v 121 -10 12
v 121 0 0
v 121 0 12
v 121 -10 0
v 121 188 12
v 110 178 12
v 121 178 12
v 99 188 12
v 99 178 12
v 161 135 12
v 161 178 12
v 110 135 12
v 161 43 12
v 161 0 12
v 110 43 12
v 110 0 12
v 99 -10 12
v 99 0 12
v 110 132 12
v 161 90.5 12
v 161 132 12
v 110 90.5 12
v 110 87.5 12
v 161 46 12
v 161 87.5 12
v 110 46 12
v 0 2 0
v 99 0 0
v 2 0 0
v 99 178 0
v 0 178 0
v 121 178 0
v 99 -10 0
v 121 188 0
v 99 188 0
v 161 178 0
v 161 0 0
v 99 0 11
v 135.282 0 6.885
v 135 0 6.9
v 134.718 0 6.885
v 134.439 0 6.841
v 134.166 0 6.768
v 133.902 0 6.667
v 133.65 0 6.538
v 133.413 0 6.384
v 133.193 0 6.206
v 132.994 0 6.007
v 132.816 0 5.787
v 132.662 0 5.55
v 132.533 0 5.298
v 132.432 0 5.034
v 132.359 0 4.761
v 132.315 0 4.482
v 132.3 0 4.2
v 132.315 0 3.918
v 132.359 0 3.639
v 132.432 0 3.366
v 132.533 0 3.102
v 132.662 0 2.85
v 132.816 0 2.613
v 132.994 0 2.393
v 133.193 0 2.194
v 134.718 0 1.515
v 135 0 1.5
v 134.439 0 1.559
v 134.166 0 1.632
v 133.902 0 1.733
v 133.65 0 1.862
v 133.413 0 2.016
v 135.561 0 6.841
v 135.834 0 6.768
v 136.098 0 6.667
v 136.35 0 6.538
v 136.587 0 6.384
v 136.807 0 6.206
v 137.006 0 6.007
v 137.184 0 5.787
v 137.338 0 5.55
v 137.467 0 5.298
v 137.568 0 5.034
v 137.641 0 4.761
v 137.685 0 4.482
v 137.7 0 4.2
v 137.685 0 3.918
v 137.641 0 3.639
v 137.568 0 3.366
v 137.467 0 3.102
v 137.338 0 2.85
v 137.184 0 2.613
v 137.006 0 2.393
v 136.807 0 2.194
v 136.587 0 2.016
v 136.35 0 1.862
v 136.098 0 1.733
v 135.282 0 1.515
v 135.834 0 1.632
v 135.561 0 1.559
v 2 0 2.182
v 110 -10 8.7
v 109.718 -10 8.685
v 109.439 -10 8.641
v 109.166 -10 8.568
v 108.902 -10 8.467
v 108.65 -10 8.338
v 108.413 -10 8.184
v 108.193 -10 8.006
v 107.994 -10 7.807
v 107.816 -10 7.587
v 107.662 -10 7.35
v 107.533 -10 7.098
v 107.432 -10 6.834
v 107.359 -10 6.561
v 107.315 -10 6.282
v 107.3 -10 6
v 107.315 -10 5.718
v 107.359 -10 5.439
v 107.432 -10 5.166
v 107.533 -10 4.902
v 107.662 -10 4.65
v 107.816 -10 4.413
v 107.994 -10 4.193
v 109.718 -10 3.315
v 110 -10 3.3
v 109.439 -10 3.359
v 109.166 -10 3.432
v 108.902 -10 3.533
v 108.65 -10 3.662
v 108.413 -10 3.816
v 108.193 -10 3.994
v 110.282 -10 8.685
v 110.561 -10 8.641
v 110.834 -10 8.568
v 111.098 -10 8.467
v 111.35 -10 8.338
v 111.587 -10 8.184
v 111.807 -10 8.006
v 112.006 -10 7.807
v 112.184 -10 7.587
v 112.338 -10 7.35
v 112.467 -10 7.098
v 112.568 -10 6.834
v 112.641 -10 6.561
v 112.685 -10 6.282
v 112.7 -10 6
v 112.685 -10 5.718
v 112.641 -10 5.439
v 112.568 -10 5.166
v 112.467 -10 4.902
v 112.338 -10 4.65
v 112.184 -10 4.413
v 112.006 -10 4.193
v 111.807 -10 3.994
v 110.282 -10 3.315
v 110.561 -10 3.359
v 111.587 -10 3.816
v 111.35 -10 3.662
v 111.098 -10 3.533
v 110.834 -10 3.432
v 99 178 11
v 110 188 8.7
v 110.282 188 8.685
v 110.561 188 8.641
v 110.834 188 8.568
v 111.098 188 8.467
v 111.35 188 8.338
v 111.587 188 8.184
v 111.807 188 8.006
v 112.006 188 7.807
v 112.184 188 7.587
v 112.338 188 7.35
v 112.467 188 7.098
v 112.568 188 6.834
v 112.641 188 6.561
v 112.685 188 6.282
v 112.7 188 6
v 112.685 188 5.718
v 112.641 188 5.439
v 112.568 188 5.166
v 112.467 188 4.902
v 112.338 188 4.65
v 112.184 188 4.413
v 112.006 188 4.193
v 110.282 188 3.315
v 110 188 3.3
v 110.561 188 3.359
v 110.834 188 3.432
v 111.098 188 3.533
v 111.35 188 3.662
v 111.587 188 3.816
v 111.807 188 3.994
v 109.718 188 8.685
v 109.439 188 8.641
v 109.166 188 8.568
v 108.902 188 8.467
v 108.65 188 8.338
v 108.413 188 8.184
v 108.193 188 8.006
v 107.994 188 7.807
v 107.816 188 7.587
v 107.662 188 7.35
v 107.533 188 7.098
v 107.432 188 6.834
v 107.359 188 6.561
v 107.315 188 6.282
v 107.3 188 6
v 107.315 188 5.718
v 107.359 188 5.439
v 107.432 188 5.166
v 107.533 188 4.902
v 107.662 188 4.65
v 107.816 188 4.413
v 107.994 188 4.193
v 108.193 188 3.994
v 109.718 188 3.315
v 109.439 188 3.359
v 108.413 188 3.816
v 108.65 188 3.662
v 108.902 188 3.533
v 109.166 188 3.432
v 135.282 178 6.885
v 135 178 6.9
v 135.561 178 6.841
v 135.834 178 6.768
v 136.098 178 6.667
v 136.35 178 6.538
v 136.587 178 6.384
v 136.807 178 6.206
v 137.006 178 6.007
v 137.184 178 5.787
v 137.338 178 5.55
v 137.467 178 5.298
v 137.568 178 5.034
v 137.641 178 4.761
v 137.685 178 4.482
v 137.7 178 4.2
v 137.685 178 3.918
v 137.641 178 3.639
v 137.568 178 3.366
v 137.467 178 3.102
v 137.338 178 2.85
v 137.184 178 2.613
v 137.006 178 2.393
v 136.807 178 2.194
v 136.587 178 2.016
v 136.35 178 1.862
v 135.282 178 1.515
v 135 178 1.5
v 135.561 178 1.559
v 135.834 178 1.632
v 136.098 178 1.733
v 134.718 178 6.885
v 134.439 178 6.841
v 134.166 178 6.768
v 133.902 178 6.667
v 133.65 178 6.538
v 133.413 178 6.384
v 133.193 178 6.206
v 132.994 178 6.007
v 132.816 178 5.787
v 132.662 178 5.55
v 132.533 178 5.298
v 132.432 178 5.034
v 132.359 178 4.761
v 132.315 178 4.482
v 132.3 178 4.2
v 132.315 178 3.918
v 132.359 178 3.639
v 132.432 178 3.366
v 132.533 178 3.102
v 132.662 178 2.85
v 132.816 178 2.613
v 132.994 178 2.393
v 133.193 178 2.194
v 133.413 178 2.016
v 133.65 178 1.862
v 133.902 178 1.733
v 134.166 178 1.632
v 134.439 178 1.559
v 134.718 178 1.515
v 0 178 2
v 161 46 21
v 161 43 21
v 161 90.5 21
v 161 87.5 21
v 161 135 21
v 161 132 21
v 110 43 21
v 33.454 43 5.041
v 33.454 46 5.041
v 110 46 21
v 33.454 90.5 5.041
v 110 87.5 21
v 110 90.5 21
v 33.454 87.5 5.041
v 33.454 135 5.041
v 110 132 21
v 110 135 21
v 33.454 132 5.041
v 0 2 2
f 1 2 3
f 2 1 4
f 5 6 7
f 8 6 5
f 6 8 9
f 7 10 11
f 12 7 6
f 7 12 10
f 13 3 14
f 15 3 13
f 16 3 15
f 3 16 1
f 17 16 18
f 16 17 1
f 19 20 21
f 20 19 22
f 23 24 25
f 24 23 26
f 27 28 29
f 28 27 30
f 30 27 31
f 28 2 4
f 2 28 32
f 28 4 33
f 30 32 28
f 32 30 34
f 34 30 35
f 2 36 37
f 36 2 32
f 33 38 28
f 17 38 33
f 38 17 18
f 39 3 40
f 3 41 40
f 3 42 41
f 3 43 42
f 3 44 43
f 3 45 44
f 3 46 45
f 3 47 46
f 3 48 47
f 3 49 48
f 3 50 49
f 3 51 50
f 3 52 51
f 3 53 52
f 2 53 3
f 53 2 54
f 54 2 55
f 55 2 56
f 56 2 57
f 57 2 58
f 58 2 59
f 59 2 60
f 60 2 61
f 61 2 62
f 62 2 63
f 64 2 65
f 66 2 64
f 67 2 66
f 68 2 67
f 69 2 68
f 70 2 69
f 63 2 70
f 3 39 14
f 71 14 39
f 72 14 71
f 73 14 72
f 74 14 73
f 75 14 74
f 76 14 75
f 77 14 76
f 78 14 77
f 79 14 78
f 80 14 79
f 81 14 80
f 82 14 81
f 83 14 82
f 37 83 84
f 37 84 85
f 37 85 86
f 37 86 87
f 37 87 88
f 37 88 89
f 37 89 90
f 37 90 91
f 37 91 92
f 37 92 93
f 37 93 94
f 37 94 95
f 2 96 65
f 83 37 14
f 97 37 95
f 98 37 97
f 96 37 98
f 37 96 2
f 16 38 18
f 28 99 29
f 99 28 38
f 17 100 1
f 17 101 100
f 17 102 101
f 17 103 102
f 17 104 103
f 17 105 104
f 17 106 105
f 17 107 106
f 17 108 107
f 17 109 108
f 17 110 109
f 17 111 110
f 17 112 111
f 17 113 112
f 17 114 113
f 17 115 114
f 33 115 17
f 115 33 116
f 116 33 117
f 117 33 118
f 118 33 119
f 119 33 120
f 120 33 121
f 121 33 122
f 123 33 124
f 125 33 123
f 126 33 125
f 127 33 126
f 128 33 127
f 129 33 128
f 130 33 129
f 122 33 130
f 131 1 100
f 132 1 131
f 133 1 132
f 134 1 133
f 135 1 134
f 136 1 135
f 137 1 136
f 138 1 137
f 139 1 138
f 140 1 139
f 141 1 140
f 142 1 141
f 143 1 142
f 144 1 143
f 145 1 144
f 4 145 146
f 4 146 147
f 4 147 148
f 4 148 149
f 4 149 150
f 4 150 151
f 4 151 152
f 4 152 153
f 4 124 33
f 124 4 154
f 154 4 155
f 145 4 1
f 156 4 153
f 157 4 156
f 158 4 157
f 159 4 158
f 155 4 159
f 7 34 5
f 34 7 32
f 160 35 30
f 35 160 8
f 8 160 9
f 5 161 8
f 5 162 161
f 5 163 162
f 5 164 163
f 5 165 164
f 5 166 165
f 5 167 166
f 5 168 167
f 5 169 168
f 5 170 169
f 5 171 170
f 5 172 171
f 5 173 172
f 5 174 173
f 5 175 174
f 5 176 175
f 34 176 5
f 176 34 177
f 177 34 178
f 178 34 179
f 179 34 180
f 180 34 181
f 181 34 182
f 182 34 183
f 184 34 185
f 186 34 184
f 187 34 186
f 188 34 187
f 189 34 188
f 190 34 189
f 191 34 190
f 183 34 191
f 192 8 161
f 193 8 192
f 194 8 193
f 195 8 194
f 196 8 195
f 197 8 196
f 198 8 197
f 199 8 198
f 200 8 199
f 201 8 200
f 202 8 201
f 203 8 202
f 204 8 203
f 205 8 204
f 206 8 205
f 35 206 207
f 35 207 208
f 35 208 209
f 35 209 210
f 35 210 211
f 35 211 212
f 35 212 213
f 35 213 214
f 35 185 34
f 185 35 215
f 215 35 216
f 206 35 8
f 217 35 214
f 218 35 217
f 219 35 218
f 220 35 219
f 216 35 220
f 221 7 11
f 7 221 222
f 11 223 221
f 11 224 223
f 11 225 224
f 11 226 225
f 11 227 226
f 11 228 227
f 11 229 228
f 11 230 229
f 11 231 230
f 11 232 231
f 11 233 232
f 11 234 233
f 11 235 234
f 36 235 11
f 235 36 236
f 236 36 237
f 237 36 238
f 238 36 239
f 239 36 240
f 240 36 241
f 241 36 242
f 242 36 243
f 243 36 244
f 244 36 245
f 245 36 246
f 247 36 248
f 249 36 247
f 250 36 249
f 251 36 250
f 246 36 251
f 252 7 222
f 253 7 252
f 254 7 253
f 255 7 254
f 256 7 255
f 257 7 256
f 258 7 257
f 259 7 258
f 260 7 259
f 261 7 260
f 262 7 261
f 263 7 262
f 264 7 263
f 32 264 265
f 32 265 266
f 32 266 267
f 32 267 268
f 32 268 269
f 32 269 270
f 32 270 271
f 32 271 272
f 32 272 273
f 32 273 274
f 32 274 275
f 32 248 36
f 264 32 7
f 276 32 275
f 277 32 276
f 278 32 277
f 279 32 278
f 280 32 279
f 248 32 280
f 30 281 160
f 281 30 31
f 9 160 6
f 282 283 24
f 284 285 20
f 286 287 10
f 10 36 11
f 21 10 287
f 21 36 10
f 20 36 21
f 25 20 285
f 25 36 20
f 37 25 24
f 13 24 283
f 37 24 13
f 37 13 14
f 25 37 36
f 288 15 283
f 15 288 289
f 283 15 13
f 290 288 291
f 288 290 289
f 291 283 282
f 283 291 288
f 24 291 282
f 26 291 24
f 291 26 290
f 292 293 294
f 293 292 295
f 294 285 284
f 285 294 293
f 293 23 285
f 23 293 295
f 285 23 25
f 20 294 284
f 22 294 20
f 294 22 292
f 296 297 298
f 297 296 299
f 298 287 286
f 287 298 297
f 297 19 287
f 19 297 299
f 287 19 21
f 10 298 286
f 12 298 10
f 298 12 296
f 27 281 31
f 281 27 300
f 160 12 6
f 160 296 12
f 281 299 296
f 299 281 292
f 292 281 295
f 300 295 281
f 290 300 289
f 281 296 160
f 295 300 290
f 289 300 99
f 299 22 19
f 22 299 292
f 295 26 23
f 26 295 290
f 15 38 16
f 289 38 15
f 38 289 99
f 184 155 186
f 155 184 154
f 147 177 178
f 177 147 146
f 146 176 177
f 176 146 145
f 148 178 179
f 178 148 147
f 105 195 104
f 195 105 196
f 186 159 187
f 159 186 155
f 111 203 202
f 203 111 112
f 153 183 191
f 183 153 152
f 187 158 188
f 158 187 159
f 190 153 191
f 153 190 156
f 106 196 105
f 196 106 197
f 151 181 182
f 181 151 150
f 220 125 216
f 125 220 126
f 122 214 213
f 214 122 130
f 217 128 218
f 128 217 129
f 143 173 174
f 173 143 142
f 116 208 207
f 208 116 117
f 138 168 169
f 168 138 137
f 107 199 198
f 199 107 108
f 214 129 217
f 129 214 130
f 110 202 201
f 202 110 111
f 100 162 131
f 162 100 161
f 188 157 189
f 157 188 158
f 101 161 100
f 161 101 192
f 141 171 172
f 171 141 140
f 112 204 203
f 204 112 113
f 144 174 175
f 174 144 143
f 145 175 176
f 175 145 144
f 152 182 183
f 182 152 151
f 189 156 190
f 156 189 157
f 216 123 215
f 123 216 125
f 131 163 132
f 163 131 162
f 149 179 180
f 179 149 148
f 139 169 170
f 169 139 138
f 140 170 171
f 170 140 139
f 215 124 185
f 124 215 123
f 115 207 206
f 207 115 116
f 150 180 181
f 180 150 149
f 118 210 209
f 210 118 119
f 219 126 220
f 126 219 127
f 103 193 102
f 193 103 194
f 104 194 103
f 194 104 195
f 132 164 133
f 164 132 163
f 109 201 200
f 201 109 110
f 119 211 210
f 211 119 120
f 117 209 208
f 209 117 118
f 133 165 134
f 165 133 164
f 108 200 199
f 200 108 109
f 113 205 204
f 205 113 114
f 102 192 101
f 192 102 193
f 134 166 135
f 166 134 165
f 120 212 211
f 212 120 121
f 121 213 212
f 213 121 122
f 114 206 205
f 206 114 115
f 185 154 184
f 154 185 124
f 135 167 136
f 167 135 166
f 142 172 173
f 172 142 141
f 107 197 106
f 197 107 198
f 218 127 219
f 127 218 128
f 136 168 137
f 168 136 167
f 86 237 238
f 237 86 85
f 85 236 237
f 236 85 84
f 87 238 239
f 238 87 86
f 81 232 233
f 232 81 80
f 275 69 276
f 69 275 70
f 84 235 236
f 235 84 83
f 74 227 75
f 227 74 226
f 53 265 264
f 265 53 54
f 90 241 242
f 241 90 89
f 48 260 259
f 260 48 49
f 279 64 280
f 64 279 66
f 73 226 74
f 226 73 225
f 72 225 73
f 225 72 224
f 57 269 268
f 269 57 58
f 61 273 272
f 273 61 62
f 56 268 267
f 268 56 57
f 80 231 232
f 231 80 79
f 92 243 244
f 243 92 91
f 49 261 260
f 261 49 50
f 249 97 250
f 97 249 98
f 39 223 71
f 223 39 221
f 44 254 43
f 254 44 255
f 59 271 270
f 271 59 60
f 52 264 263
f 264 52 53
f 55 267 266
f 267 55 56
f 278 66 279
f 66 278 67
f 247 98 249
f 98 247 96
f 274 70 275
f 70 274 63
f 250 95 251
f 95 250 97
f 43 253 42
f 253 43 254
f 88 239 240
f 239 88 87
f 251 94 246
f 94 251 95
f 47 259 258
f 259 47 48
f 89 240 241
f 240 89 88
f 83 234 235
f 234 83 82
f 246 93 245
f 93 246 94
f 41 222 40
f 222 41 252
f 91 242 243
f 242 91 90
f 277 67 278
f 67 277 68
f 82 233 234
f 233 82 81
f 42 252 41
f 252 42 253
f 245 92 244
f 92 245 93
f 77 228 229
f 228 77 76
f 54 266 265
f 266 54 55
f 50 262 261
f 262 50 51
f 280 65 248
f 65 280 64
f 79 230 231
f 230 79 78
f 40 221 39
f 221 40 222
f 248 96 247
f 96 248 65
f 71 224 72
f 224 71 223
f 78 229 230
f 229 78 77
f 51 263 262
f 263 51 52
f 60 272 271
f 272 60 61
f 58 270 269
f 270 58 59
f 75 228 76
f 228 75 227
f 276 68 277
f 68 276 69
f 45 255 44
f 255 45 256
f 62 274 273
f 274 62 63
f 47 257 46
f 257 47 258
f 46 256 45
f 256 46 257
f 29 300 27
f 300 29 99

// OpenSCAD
// ═══════════════════════════════════════════════════════════════════
//  THE GHOST ROBOT — Flipper Arm
//  ─────────────────────────────
//  Pivot-lever wedge flipper for 25mm linear actuator
//
//  HOW IT WORKS:
//    1. Pivot bolt runs through the ears → fixed to chassis side walls
//    2. Arm rests with tip at ground level (~2mm clearance)
//    3. Actuator rod connects through the rear hole (bolt in Y direction)
//    4. Actuator extends → pushes rear section → tip rises → flips opponent
//
//  Side view:
//
//    [chassis front]
//         |
//    ─────●──────────────────── tip  ← resting position (wedge low)
//    pivot↑
//         |
//    ACT══● ← actuator pushes here (below pivot on rear section)
//
//    When ACT extends:
//    tip ╱╱╱╱  ← rises up ~50mm from 25mm actuator stroke
//
//  PRINT SETTINGS:
//    Material   : PETG
//    Layer      : 0.2mm
//    Infill     : 40% gyroid
//    Perimeters : 4
//    Orientation: flat (bottom face down, no supports needed)
//
//  HARDWARE:
//    Pivot  : M5 bolt × 2 + M5 nuts (through chassis side walls + ears)
//    Actuator: M5 bolt through rear hole → actuator rod end clevis
// ═══════════════════════════════════════════════════════════════════

// ─── Parameters — adjust these to fit your robot ─────────────────

ARM_FWD     = 110;   // mm — pivot to tip (forward arm length)
ARM_REAR    = 50;    // mm — pivot to back (lever arm for actuator)
ARM_WIDTH   = 178;   // mm — full arm width (fits inside 200mm robot)

THICK_ROOT  = 12;    // mm — arm thickness at pivot + rear (structural)
THICK_TIP   = 2;     // mm — wedge tip thickness (gets under opponent)

EAR_DEPTH   = 10;    // mm — how far each ear extends beyond arm edge
EAR_LENGTH  = 22;    // mm — ear length along X axis (around pivot)

PIVOT_D     = 5.4;   // mm — pivot bolt hole (M5 clearance = 5.4mm)
ACT_D       = 5.4;   // mm — actuator bolt hole (M5 clearance)

// Actuator hole position within rear section
// X: how far from rear end (0 = at rear, 1 = at pivot)
// Z: height fraction of arm thickness (0 = bottom, 1 = top)
ACT_X_FRAC  = 0.5;   // 50% into rear section
ACT_Z_FRAC  = 0.35;  // 35% height = lower portion (below pivot center)

RIB_H       = 9;     // mm — rib height above arm top face
RIB_T       = 3;     // mm — rib thickness

// ─────────────────────────────────────────────────────────────────
$fn = 60;

// Computed positions
PIVOT_X  = ARM_FWD;
REAR_END = ARM_FWD + ARM_REAR;
ACT_X    = ARM_FWD + ARM_REAR * ACT_X_FRAC;
ACT_Z    = THICK_ROOT * ACT_Z_FRAC;

// ─── Main arm body ────────────────────────────────────────────────
// Bottom face is flat at Z=0 (rests on ground when retracted)
// Top face tapers: full thickness at pivot/rear, thin at tip
module arm_body() {
    hull() {
        // Tip — thin wedge edge
        cube([1, ARM_WIDTH, THICK_TIP]);

        // At pivot — full thickness
        translate([PIVOT_X, 0, 0])
            cube([1, ARM_WIDTH, THICK_ROOT]);

        // At rear end — full thickness
        translate([REAR_END, 0, 0])
            cube([1, ARM_WIDTH, THICK_ROOT]);
    }
}

// ─── Pivot ears ───────────────────────────────────────────────────
// Solid blocks extending beyond arm width on both sides
// The pivot bolt passes through these + the arm body
module pivot_ears() {
    // Left ear (Y < 0)
    translate([PIVOT_X - EAR_LENGTH/2, -EAR_DEPTH, 0])
        cube([EAR_LENGTH, EAR_DEPTH, THICK_ROOT]);

    // Right ear (Y > ARM_WIDTH)
    translate([PIVOT_X - EAR_LENGTH/2, ARM_WIDTH, 0])
        cube([EAR_LENGTH, EAR_DEPTH, THICK_ROOT]);
}

// ─── Reinforcing ribs ─────────────────────────────────────────────
// Longitudinal ribs on the top face for stiffness
// Tapers with the arm: low at tip, full height at pivot and rear
module ribs() {
    rib_ys = [ARM_WIDTH * 0.25, ARM_WIDTH * 0.5, ARM_WIDTH * 0.75];

    for (y = rib_ys) {
        hull() {
            // Near tip — very short rib starts here
            translate([ARM_FWD * 0.25, y - RIB_T/2, THICK_TIP])
                cube([1, RIB_T, RIB_H * 0.2]);

            // At pivot — full rib height
            translate([PIVOT_X, y - RIB_T/2, THICK_ROOT])
                cube([1, RIB_T, RIB_H]);

            // At rear — full rib height
            translate([REAR_END, y - RIB_T/2, THICK_ROOT])
                cube([1, RIB_T, RIB_H]);
        }
    }
}

// ─── Wedge tip chamfer ────────────────────────────────────────────
// Small 45° chamfer on the bottom front edge
// Helps the arm slide under the opponent smoothly
module tip_chamfer() {
    chamfer = THICK_TIP * 1.5;
    translate([0, -1, 0])
        rotate([0, 0, 0])
            // Cut a triangular prism from the very front bottom edge
            linear_extrude(height = ARM_WIDTH + 2)
                polygon([[0, 0], [chamfer, 0], [0, chamfer]]);
}

// ─── Final model ──────────────────────────────────────────────────
difference() {
    union() {
        arm_body();
        pivot_ears();
        ribs();
    }

    // Pivot hole — through full arm width + both ears, at mid-thickness
    translate([PIVOT_X, -EAR_DEPTH - 1, THICK_ROOT / 2])
        rotate([-90, 0, 0])
            cylinder(d = PIVOT_D, h = ARM_WIDTH + EAR_DEPTH * 2 + 2);

    // Actuator hole — runs full width for flexible rod-end placement
    translate([ACT_X, -1, ACT_Z])
        rotate([-90, 0, 0])
            cylinder(d = ACT_D, h = ARM_WIDTH + 2);

    // Tip chamfer — bottom front edge
    tip_chamfer();
}

// ─── Dimensions echo (visible in OpenSCAD console) ───────────────
echo("=== FLIPPER ARM DIMENSIONS ===");
echo(str("Width        : ", ARM_WIDTH, " mm"));
echo(str("Fwd length   : ", ARM_FWD,   " mm  (pivot to tip)"));
echo(str("Rear length  : ", ARM_REAR,  " mm  (pivot to actuator)"));
echo(str("Total length : ", ARM_FWD + ARM_REAR, " mm"));
echo(str("Tip thickness: ", THICK_TIP, " mm"));
echo(str("Root thick   : ", THICK_ROOT," mm"));
echo(str("Pivot hole X : ", PIVOT_X,   " mm from tip"));
echo(str("Actuator X   : ", ACT_X,     " mm from tip"));
echo(str("Actuator Z   : ", ACT_Z,     " mm from bottom"));
echo("Pivot bolt  : M5");
echo("Actuator bolt: M5");
echo("Material    : PETG, 40% gyroid, 4 perimeters");
